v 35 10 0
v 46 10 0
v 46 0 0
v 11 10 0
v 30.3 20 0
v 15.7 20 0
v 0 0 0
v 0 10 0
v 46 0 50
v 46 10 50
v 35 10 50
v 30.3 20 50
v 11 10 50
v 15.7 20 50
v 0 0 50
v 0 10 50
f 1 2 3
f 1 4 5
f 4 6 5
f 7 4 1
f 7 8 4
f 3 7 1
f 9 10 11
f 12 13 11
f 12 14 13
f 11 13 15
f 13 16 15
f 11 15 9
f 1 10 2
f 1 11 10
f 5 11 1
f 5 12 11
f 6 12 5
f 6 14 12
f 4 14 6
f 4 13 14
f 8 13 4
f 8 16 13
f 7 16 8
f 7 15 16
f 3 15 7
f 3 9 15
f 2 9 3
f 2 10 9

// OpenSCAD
$fn = 32;

// ----------------------------------------------------------------------
// V guide rail: dovetail, 46 mm wide
// ----------------------------------------------------------------------

// --- parameters (mm) ---
rail_w = 46;              // rail width, X
base_t = 10;              // base plate thickness
v_depth = 10;             // V feature depth / height
v_half_w = 12;            // half width of the V at the base face
plate_t = 50;             // rail length, Z (the extrusion height)
top_half_w = 7.3;         // half width at the dovetail top
fit_tol = 0.1;            // declared fit tolerance (prompt contract)
free_tol = 0.3;           // declared free tolerance (prompt contract)

dovetail_base = 2 * v_half_w;  // dovetail width at the base
dovetail_top = 2 * top_half_w;  // dovetail width at the top

profile = [[0, 0], [46, 0], [46, 10], [35, 10], [30.3, 20], [15.7, 20], [11, 10], [0, 10]];  // primary outline, 8 points, counter clockwise

// --- the one profile operation ---
linear_extrude(height = plate_t) polygon(points = profile);
